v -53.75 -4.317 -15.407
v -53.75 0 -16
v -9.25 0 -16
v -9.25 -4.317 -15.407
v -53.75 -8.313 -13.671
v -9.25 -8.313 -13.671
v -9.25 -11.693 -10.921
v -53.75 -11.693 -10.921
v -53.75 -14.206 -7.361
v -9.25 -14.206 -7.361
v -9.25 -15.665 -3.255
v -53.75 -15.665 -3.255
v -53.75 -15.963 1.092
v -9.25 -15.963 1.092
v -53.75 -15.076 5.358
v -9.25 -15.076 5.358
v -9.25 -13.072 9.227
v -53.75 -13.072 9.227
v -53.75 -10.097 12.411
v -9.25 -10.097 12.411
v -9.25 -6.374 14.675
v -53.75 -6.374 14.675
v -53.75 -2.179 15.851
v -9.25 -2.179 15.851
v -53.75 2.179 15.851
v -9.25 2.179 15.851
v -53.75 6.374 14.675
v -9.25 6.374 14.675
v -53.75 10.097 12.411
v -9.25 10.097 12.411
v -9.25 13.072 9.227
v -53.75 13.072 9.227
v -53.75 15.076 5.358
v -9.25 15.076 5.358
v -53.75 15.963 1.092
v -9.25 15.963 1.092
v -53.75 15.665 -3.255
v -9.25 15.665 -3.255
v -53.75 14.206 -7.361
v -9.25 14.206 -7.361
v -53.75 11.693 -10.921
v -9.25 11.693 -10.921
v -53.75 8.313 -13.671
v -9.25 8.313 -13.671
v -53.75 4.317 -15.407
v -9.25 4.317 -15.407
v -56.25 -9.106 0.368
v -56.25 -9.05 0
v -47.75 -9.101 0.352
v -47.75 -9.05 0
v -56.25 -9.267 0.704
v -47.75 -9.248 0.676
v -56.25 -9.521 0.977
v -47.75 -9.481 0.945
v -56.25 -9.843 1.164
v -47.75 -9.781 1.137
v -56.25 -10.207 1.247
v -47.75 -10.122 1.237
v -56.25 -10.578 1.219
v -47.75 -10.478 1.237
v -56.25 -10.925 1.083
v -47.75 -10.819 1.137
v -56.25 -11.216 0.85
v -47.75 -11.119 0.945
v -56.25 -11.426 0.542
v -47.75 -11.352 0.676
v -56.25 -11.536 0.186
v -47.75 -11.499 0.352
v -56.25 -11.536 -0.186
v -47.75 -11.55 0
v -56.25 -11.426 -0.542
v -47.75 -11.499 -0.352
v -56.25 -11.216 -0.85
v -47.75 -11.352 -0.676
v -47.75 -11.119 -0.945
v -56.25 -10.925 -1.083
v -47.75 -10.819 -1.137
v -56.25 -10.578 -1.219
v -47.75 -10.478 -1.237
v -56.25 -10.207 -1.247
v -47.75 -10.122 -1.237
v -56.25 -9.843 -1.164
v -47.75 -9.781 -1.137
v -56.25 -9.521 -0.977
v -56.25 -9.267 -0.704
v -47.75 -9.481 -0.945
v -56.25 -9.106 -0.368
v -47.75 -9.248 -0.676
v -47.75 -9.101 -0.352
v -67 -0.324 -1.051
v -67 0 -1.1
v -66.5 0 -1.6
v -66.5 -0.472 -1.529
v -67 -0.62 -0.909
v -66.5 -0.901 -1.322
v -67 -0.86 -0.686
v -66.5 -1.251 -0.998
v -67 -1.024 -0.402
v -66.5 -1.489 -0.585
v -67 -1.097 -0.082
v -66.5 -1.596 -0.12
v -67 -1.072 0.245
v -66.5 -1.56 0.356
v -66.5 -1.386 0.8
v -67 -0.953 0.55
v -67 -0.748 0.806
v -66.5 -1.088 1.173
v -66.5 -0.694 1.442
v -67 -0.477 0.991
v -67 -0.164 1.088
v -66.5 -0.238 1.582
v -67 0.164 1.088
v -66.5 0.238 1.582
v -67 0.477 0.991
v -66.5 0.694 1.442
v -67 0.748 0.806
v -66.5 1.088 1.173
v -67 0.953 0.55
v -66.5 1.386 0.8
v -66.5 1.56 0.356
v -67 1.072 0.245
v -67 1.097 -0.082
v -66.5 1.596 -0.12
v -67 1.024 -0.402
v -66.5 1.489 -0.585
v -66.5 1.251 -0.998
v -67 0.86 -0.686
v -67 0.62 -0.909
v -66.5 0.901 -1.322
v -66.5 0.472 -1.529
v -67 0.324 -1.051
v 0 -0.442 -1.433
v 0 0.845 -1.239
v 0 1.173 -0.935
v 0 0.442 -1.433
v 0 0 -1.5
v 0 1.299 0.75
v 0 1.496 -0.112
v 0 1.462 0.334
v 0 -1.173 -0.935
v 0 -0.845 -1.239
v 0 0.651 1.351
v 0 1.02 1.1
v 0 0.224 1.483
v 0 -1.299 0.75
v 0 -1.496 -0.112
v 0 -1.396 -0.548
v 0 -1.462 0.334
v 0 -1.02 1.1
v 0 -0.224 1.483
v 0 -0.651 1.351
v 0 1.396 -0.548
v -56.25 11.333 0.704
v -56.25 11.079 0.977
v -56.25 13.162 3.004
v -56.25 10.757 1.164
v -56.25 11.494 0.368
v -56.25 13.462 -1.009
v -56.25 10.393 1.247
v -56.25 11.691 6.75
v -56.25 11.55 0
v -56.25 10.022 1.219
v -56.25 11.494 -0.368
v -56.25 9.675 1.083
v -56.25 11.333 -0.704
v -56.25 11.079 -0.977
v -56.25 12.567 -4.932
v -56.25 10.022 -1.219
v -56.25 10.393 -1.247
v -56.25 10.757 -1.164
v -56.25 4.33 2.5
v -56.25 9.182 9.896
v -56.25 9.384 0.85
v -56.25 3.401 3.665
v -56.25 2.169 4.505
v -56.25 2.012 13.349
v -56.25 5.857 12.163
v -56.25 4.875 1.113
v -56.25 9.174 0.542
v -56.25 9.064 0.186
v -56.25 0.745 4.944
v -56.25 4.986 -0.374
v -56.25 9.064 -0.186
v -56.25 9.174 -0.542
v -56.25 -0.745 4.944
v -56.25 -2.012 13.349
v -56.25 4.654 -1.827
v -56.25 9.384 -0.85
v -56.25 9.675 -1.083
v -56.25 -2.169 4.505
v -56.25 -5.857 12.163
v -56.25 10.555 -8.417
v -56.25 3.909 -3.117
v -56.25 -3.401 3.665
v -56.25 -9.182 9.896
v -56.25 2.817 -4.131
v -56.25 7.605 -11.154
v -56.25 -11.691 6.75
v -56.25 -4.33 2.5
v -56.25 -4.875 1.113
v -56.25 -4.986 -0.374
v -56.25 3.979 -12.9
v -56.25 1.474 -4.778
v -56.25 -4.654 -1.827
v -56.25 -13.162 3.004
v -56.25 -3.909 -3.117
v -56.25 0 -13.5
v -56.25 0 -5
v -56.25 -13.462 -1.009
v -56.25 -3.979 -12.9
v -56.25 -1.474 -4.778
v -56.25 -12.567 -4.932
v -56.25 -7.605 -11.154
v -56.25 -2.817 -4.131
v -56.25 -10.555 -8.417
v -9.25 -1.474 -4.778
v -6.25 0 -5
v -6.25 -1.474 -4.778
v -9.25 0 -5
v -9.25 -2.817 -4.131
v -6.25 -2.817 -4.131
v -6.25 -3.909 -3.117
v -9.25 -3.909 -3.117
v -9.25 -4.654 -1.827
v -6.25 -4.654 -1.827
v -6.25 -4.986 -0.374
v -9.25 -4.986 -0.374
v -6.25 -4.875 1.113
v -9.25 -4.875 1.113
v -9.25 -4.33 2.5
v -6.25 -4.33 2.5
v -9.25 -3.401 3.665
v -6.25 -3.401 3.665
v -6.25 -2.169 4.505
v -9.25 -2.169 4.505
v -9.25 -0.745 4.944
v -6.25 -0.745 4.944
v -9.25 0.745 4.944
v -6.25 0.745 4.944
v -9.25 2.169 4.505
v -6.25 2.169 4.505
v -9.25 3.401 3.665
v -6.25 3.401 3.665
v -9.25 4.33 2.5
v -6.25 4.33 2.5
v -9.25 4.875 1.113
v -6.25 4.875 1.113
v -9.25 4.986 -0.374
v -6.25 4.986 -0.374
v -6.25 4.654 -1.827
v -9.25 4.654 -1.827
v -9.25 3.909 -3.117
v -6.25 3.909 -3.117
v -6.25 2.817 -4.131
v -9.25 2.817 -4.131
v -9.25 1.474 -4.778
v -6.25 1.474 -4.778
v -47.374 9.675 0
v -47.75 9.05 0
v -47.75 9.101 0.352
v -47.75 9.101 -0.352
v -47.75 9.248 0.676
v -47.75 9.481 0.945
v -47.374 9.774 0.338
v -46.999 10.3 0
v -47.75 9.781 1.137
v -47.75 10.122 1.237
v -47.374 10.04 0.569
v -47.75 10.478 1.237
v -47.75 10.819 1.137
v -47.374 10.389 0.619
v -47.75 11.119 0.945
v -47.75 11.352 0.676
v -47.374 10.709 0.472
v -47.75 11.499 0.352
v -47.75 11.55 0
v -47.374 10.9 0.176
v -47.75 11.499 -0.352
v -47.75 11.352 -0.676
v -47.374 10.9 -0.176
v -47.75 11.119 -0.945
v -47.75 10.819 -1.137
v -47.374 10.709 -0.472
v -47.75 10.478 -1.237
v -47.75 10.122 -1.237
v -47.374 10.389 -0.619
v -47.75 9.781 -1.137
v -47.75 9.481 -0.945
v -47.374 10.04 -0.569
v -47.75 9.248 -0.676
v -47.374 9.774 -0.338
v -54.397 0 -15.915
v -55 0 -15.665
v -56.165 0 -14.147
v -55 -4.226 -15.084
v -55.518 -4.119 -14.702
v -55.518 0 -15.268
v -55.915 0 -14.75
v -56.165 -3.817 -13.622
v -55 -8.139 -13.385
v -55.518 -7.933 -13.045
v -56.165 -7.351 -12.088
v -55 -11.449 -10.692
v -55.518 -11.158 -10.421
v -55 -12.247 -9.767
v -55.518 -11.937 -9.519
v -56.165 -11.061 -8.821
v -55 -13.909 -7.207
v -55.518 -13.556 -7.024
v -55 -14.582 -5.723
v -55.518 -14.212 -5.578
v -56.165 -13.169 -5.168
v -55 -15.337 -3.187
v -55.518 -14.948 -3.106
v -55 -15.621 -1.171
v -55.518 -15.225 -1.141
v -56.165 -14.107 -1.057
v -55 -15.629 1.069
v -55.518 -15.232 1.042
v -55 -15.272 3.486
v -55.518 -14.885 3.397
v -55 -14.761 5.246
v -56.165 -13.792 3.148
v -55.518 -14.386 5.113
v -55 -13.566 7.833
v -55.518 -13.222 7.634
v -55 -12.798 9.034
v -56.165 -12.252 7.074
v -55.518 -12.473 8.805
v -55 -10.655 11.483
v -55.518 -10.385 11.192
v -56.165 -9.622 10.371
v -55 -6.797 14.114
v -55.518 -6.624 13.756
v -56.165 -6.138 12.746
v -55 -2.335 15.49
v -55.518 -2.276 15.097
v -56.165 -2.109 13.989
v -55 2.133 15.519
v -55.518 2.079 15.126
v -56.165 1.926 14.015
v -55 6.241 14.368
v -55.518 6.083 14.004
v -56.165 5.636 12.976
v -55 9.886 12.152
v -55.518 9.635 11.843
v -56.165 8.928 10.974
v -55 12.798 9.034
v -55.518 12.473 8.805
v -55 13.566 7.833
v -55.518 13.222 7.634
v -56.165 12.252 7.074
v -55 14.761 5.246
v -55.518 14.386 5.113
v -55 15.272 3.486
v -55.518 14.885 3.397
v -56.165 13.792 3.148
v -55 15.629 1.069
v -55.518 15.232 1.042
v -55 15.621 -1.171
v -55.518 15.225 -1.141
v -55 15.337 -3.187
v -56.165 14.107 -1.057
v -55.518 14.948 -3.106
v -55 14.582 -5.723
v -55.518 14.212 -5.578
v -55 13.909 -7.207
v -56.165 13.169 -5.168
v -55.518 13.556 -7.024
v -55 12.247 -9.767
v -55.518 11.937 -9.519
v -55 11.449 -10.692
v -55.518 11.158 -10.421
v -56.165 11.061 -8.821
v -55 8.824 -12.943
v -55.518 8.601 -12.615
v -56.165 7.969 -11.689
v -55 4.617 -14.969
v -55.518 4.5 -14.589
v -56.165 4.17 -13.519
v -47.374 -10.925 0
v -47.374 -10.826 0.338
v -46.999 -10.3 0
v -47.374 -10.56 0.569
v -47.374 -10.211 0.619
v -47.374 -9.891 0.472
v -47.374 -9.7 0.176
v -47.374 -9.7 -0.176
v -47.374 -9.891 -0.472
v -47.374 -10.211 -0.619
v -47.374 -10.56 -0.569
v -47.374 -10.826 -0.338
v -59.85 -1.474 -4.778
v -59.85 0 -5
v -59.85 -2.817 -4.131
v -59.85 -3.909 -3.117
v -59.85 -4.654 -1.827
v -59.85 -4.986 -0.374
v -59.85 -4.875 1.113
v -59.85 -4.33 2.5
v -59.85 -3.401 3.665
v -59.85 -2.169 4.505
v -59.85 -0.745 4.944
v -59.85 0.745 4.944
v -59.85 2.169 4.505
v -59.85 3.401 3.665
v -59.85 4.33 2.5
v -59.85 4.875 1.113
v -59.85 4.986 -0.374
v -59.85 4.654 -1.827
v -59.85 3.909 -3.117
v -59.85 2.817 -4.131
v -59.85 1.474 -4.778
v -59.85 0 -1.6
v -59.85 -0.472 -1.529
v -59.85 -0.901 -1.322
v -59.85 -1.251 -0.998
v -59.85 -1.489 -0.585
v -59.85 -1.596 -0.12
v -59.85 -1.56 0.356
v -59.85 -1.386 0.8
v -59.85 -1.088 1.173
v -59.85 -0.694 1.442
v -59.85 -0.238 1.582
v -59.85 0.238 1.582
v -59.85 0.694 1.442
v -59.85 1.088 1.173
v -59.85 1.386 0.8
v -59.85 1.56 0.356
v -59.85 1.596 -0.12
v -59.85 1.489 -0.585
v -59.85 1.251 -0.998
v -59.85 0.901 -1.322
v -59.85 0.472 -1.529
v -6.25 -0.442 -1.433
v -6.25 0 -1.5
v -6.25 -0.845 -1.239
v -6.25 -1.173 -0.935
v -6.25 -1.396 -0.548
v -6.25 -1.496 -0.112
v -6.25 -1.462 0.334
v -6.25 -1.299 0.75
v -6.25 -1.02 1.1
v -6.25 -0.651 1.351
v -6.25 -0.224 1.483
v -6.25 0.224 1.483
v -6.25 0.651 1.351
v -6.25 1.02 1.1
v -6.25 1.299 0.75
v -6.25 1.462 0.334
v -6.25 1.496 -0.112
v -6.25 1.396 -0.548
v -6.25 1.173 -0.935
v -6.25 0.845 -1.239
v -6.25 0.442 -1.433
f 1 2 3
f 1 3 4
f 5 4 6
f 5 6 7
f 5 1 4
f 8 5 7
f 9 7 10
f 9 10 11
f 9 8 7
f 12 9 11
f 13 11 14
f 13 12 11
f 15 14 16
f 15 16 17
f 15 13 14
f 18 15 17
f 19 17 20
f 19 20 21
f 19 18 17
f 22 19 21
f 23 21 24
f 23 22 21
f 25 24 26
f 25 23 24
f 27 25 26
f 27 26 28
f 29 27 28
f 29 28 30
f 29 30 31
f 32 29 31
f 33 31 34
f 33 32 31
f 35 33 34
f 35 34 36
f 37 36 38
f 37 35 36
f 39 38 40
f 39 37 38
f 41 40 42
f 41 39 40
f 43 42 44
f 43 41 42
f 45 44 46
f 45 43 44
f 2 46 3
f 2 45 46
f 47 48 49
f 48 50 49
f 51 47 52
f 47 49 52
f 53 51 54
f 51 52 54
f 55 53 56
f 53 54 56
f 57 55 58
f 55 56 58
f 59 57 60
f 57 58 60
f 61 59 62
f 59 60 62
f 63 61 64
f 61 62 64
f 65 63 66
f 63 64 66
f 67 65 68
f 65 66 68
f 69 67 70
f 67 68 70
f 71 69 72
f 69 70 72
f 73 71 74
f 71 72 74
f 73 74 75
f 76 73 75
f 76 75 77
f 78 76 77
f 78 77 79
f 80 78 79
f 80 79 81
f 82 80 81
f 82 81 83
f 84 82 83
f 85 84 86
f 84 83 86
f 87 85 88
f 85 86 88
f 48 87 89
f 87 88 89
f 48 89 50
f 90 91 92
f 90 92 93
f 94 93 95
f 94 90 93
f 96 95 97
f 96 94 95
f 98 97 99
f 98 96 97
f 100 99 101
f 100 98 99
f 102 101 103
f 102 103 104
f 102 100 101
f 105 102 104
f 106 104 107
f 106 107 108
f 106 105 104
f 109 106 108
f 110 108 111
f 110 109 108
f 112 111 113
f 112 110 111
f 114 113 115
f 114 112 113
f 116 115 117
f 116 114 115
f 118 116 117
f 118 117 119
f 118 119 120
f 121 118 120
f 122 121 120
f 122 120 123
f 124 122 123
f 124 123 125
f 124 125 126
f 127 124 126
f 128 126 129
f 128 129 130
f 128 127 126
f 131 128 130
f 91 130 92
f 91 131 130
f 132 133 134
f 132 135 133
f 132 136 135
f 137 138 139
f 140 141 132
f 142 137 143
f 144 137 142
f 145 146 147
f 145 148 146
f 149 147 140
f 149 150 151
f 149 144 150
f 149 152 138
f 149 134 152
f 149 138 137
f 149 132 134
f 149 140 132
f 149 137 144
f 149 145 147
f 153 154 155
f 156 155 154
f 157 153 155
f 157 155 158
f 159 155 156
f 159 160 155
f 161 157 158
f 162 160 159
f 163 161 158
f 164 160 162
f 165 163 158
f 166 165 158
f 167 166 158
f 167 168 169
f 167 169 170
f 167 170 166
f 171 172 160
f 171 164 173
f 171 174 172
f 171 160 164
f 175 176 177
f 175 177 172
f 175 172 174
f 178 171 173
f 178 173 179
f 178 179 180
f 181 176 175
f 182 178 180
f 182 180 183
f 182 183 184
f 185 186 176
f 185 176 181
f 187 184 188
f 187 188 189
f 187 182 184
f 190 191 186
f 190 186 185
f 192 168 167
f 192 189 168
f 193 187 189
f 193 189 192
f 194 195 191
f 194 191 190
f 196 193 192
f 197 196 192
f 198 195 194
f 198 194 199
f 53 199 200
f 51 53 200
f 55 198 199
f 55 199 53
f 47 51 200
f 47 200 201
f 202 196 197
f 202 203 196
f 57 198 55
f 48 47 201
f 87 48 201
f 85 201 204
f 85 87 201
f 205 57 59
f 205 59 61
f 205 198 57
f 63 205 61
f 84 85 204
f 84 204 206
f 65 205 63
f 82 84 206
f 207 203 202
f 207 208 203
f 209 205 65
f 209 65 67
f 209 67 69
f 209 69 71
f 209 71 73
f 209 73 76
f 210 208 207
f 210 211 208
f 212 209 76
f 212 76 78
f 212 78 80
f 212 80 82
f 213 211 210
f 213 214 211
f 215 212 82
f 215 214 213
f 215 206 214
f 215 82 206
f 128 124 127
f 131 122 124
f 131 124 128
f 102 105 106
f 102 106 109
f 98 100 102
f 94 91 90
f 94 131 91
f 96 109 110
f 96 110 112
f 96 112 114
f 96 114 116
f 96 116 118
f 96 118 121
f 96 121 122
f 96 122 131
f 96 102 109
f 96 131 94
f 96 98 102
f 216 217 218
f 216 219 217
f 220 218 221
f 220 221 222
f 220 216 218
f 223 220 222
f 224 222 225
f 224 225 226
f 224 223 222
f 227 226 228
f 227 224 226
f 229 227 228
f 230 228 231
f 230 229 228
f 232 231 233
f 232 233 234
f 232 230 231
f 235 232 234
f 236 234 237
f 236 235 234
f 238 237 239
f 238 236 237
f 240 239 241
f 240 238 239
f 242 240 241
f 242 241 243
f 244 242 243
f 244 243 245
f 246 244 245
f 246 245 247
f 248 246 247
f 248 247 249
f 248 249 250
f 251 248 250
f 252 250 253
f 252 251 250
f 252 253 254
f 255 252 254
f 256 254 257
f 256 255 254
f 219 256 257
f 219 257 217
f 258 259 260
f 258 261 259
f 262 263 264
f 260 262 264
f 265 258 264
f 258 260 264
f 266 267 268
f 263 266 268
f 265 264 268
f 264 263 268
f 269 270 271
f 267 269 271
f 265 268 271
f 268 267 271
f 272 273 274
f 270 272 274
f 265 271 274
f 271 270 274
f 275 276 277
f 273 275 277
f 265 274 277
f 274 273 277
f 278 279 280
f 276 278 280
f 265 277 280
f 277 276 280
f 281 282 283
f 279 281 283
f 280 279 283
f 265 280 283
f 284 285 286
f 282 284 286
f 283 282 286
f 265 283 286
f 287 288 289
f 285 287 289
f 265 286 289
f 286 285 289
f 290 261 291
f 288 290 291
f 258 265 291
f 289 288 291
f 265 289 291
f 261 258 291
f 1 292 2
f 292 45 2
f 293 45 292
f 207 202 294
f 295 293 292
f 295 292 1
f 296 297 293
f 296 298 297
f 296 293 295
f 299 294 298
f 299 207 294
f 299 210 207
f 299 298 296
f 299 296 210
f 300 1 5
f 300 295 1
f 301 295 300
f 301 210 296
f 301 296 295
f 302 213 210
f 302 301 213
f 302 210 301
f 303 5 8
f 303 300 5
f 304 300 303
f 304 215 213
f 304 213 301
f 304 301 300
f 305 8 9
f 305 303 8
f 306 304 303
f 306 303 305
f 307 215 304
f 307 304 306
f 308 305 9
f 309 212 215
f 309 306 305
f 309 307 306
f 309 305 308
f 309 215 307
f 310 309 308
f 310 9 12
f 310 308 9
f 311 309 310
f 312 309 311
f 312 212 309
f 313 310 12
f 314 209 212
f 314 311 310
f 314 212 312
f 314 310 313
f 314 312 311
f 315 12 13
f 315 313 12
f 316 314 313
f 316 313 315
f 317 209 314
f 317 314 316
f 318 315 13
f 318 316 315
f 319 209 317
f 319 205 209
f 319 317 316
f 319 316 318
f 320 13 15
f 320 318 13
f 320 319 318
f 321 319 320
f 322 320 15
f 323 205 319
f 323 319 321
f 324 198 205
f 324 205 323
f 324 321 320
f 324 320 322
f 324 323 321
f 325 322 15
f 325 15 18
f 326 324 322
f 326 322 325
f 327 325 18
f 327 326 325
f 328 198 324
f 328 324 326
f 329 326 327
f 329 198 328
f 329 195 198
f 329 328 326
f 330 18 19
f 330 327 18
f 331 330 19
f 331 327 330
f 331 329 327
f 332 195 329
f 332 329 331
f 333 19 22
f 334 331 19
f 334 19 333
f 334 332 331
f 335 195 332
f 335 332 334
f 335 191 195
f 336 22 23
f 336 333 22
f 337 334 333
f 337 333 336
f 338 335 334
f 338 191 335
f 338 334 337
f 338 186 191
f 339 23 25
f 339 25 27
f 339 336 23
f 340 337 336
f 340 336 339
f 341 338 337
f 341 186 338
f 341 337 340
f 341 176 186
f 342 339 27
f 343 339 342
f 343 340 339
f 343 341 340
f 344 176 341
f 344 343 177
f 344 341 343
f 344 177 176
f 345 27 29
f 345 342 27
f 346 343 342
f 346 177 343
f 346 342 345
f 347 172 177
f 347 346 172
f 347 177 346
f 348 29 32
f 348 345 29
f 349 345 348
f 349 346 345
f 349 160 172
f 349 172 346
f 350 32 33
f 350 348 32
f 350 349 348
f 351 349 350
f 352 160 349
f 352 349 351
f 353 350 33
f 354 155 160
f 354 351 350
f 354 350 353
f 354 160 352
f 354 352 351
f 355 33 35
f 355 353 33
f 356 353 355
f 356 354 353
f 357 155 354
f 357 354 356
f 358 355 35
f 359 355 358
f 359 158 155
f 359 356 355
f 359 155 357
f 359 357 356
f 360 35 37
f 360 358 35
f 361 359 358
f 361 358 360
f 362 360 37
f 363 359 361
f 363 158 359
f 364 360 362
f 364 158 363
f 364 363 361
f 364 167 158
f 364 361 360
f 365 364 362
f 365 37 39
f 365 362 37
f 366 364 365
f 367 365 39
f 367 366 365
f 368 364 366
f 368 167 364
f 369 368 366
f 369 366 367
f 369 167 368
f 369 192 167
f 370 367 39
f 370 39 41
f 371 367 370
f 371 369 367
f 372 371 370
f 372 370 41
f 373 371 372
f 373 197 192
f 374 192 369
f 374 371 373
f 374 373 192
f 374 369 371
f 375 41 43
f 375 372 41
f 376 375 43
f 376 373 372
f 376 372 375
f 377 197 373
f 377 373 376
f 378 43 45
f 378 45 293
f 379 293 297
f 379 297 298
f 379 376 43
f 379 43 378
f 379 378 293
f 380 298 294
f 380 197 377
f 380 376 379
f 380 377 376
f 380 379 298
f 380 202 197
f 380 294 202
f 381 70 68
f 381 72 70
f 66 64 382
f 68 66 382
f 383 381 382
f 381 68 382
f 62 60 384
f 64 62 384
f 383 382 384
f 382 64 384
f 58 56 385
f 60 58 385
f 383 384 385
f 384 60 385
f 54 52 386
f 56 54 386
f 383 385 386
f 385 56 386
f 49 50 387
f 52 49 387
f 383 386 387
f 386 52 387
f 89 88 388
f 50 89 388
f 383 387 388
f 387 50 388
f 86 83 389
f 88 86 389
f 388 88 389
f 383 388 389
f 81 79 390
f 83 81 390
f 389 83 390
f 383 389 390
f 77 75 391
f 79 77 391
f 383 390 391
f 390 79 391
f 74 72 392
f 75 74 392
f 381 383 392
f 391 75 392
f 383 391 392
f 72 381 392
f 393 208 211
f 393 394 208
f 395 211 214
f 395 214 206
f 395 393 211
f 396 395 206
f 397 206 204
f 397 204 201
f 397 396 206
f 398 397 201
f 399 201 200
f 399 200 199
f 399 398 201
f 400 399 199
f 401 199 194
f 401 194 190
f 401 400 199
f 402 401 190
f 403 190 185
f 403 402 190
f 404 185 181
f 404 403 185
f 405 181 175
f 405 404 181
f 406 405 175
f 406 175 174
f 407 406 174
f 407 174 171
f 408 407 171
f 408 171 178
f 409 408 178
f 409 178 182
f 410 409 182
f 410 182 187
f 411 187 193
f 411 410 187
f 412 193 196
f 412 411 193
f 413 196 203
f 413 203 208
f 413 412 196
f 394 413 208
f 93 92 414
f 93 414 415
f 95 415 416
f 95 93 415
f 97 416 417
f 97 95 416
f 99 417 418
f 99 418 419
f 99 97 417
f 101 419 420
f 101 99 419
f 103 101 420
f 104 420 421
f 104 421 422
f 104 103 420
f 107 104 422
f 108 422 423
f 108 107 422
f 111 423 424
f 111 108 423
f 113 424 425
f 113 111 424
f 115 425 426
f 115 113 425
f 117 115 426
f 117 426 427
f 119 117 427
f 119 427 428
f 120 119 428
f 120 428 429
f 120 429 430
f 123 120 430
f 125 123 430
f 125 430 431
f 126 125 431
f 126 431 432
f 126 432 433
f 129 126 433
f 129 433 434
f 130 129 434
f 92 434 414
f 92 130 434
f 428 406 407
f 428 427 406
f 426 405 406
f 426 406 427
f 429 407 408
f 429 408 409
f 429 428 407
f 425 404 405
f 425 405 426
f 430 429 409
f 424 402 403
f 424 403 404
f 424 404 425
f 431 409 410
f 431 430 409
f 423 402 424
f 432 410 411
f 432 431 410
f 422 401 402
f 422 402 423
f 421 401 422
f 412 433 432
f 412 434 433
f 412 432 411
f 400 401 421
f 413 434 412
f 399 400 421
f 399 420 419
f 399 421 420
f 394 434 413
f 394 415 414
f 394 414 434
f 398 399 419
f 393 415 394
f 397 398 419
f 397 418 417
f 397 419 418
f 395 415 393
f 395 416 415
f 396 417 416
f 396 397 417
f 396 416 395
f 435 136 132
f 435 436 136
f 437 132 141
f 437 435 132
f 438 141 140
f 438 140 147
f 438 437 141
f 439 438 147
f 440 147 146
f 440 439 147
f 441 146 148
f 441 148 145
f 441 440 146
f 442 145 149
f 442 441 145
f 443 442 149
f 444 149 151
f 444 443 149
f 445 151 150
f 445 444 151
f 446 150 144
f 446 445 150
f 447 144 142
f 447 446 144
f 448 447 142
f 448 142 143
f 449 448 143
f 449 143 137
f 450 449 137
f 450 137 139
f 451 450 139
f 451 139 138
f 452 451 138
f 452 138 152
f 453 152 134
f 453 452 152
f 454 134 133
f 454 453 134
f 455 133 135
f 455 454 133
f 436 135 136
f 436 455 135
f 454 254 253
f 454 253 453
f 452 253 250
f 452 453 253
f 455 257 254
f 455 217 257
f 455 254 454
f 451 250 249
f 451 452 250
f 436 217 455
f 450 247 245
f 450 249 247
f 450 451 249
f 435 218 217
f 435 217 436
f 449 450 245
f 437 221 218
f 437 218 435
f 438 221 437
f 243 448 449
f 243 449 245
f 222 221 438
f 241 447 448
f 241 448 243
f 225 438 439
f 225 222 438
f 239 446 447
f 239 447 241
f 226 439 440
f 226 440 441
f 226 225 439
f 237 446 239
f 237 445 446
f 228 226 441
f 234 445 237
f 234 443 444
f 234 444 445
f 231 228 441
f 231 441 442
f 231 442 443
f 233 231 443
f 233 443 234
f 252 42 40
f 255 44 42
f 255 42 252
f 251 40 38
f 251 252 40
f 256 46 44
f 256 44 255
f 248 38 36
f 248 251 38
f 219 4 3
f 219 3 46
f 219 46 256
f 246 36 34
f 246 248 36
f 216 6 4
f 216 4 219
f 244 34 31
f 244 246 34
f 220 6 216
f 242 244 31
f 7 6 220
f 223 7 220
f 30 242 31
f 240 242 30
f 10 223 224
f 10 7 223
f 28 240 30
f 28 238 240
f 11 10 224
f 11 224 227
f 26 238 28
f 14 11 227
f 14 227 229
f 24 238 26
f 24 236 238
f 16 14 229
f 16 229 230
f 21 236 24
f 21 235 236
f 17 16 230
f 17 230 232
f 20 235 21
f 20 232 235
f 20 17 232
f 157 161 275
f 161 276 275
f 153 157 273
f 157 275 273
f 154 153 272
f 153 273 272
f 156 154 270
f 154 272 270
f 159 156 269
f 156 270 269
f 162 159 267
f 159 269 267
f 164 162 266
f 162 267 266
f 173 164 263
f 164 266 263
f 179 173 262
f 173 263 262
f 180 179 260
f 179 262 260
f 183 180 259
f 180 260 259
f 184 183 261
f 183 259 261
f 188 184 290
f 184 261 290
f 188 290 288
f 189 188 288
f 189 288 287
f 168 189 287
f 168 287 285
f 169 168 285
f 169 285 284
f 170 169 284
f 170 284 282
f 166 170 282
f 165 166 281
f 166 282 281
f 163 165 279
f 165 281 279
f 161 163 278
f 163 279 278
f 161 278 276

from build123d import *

# Parameters (mm, degrees)
REDONDEO1_R                   = 2.5
TALADRO_ROSCADO_M3X0_51_D     = 2.5
TALADRO_ROSCADO_M3X0_51_DEPTH = 8.5
TALADRO_ROSCADO_M3X0_51_TIP   = 0.751075774
CHAFL_N1_SIZE                 = 0.5


with BuildPart() as part:
    # Croquis1 → Revolución1 (revolve)
    with BuildSketch(Plane(origin=(0, 0, 0), x_dir=(0, 1, 0), z_dir=(0, 0, 1)), mode=Mode.PRIVATE) as revoluci_n1_sk:
        Polygon((0, 0), (1.5, 0), (1.5, 6.25), (5, 6.25), (5, 9.25), (16, 9.25), (16, 56.25), (5, 56.25), (5, 59.85), (1.6, 59.85), (1.6, 67), (0, 67), align=None)
    revolve(revoluci_n1_sk.sketch.rotate(Axis((0, 0, 0), (-1, 0, 0)), 90), axis=Axis((0, 0, 0), (-1, 0, 0)))

    # Redondeo1
    redondeo1_edges = [part.edges().sort_by_distance(p)[0] for p in [
        (-56.25, 0, 16),
    ]]
    fillet(redondeo1_edges, radius=REDONDEO1_R)

    # Taladro roscado M3x0.51
    with Locations(Plane(origin=(-56.25, 0, 0), x_dir=(0, -1, 0), z_dir=(-1, 0, 0))):
        with Locations((-10.3, 0), (10.3, 0)):
            Hole(TALADRO_ROSCADO_M3X0_51_D / 2, depth=TALADRO_ROSCADO_M3X0_51_DEPTH)
            with Locations((0, 0, -(TALADRO_ROSCADO_M3X0_51_DEPTH + TALADRO_ROSCADO_M3X0_51_TIP / 2))):  # 118° drill point
                Cone(0, TALADRO_ROSCADO_M3X0_51_D / 2, TALADRO_ROSCADO_M3X0_51_TIP, mode=Mode.SUBTRACT)

    # Chaflán1
    chafl_n1_edges = [part.edges().sort_by_distance(p)[0] for p in [
        (-67, 0, 1.6),
    ]]
    chamfer(chafl_n1_edges, length=CHAFL_N1_SIZE)


solid = part.part
